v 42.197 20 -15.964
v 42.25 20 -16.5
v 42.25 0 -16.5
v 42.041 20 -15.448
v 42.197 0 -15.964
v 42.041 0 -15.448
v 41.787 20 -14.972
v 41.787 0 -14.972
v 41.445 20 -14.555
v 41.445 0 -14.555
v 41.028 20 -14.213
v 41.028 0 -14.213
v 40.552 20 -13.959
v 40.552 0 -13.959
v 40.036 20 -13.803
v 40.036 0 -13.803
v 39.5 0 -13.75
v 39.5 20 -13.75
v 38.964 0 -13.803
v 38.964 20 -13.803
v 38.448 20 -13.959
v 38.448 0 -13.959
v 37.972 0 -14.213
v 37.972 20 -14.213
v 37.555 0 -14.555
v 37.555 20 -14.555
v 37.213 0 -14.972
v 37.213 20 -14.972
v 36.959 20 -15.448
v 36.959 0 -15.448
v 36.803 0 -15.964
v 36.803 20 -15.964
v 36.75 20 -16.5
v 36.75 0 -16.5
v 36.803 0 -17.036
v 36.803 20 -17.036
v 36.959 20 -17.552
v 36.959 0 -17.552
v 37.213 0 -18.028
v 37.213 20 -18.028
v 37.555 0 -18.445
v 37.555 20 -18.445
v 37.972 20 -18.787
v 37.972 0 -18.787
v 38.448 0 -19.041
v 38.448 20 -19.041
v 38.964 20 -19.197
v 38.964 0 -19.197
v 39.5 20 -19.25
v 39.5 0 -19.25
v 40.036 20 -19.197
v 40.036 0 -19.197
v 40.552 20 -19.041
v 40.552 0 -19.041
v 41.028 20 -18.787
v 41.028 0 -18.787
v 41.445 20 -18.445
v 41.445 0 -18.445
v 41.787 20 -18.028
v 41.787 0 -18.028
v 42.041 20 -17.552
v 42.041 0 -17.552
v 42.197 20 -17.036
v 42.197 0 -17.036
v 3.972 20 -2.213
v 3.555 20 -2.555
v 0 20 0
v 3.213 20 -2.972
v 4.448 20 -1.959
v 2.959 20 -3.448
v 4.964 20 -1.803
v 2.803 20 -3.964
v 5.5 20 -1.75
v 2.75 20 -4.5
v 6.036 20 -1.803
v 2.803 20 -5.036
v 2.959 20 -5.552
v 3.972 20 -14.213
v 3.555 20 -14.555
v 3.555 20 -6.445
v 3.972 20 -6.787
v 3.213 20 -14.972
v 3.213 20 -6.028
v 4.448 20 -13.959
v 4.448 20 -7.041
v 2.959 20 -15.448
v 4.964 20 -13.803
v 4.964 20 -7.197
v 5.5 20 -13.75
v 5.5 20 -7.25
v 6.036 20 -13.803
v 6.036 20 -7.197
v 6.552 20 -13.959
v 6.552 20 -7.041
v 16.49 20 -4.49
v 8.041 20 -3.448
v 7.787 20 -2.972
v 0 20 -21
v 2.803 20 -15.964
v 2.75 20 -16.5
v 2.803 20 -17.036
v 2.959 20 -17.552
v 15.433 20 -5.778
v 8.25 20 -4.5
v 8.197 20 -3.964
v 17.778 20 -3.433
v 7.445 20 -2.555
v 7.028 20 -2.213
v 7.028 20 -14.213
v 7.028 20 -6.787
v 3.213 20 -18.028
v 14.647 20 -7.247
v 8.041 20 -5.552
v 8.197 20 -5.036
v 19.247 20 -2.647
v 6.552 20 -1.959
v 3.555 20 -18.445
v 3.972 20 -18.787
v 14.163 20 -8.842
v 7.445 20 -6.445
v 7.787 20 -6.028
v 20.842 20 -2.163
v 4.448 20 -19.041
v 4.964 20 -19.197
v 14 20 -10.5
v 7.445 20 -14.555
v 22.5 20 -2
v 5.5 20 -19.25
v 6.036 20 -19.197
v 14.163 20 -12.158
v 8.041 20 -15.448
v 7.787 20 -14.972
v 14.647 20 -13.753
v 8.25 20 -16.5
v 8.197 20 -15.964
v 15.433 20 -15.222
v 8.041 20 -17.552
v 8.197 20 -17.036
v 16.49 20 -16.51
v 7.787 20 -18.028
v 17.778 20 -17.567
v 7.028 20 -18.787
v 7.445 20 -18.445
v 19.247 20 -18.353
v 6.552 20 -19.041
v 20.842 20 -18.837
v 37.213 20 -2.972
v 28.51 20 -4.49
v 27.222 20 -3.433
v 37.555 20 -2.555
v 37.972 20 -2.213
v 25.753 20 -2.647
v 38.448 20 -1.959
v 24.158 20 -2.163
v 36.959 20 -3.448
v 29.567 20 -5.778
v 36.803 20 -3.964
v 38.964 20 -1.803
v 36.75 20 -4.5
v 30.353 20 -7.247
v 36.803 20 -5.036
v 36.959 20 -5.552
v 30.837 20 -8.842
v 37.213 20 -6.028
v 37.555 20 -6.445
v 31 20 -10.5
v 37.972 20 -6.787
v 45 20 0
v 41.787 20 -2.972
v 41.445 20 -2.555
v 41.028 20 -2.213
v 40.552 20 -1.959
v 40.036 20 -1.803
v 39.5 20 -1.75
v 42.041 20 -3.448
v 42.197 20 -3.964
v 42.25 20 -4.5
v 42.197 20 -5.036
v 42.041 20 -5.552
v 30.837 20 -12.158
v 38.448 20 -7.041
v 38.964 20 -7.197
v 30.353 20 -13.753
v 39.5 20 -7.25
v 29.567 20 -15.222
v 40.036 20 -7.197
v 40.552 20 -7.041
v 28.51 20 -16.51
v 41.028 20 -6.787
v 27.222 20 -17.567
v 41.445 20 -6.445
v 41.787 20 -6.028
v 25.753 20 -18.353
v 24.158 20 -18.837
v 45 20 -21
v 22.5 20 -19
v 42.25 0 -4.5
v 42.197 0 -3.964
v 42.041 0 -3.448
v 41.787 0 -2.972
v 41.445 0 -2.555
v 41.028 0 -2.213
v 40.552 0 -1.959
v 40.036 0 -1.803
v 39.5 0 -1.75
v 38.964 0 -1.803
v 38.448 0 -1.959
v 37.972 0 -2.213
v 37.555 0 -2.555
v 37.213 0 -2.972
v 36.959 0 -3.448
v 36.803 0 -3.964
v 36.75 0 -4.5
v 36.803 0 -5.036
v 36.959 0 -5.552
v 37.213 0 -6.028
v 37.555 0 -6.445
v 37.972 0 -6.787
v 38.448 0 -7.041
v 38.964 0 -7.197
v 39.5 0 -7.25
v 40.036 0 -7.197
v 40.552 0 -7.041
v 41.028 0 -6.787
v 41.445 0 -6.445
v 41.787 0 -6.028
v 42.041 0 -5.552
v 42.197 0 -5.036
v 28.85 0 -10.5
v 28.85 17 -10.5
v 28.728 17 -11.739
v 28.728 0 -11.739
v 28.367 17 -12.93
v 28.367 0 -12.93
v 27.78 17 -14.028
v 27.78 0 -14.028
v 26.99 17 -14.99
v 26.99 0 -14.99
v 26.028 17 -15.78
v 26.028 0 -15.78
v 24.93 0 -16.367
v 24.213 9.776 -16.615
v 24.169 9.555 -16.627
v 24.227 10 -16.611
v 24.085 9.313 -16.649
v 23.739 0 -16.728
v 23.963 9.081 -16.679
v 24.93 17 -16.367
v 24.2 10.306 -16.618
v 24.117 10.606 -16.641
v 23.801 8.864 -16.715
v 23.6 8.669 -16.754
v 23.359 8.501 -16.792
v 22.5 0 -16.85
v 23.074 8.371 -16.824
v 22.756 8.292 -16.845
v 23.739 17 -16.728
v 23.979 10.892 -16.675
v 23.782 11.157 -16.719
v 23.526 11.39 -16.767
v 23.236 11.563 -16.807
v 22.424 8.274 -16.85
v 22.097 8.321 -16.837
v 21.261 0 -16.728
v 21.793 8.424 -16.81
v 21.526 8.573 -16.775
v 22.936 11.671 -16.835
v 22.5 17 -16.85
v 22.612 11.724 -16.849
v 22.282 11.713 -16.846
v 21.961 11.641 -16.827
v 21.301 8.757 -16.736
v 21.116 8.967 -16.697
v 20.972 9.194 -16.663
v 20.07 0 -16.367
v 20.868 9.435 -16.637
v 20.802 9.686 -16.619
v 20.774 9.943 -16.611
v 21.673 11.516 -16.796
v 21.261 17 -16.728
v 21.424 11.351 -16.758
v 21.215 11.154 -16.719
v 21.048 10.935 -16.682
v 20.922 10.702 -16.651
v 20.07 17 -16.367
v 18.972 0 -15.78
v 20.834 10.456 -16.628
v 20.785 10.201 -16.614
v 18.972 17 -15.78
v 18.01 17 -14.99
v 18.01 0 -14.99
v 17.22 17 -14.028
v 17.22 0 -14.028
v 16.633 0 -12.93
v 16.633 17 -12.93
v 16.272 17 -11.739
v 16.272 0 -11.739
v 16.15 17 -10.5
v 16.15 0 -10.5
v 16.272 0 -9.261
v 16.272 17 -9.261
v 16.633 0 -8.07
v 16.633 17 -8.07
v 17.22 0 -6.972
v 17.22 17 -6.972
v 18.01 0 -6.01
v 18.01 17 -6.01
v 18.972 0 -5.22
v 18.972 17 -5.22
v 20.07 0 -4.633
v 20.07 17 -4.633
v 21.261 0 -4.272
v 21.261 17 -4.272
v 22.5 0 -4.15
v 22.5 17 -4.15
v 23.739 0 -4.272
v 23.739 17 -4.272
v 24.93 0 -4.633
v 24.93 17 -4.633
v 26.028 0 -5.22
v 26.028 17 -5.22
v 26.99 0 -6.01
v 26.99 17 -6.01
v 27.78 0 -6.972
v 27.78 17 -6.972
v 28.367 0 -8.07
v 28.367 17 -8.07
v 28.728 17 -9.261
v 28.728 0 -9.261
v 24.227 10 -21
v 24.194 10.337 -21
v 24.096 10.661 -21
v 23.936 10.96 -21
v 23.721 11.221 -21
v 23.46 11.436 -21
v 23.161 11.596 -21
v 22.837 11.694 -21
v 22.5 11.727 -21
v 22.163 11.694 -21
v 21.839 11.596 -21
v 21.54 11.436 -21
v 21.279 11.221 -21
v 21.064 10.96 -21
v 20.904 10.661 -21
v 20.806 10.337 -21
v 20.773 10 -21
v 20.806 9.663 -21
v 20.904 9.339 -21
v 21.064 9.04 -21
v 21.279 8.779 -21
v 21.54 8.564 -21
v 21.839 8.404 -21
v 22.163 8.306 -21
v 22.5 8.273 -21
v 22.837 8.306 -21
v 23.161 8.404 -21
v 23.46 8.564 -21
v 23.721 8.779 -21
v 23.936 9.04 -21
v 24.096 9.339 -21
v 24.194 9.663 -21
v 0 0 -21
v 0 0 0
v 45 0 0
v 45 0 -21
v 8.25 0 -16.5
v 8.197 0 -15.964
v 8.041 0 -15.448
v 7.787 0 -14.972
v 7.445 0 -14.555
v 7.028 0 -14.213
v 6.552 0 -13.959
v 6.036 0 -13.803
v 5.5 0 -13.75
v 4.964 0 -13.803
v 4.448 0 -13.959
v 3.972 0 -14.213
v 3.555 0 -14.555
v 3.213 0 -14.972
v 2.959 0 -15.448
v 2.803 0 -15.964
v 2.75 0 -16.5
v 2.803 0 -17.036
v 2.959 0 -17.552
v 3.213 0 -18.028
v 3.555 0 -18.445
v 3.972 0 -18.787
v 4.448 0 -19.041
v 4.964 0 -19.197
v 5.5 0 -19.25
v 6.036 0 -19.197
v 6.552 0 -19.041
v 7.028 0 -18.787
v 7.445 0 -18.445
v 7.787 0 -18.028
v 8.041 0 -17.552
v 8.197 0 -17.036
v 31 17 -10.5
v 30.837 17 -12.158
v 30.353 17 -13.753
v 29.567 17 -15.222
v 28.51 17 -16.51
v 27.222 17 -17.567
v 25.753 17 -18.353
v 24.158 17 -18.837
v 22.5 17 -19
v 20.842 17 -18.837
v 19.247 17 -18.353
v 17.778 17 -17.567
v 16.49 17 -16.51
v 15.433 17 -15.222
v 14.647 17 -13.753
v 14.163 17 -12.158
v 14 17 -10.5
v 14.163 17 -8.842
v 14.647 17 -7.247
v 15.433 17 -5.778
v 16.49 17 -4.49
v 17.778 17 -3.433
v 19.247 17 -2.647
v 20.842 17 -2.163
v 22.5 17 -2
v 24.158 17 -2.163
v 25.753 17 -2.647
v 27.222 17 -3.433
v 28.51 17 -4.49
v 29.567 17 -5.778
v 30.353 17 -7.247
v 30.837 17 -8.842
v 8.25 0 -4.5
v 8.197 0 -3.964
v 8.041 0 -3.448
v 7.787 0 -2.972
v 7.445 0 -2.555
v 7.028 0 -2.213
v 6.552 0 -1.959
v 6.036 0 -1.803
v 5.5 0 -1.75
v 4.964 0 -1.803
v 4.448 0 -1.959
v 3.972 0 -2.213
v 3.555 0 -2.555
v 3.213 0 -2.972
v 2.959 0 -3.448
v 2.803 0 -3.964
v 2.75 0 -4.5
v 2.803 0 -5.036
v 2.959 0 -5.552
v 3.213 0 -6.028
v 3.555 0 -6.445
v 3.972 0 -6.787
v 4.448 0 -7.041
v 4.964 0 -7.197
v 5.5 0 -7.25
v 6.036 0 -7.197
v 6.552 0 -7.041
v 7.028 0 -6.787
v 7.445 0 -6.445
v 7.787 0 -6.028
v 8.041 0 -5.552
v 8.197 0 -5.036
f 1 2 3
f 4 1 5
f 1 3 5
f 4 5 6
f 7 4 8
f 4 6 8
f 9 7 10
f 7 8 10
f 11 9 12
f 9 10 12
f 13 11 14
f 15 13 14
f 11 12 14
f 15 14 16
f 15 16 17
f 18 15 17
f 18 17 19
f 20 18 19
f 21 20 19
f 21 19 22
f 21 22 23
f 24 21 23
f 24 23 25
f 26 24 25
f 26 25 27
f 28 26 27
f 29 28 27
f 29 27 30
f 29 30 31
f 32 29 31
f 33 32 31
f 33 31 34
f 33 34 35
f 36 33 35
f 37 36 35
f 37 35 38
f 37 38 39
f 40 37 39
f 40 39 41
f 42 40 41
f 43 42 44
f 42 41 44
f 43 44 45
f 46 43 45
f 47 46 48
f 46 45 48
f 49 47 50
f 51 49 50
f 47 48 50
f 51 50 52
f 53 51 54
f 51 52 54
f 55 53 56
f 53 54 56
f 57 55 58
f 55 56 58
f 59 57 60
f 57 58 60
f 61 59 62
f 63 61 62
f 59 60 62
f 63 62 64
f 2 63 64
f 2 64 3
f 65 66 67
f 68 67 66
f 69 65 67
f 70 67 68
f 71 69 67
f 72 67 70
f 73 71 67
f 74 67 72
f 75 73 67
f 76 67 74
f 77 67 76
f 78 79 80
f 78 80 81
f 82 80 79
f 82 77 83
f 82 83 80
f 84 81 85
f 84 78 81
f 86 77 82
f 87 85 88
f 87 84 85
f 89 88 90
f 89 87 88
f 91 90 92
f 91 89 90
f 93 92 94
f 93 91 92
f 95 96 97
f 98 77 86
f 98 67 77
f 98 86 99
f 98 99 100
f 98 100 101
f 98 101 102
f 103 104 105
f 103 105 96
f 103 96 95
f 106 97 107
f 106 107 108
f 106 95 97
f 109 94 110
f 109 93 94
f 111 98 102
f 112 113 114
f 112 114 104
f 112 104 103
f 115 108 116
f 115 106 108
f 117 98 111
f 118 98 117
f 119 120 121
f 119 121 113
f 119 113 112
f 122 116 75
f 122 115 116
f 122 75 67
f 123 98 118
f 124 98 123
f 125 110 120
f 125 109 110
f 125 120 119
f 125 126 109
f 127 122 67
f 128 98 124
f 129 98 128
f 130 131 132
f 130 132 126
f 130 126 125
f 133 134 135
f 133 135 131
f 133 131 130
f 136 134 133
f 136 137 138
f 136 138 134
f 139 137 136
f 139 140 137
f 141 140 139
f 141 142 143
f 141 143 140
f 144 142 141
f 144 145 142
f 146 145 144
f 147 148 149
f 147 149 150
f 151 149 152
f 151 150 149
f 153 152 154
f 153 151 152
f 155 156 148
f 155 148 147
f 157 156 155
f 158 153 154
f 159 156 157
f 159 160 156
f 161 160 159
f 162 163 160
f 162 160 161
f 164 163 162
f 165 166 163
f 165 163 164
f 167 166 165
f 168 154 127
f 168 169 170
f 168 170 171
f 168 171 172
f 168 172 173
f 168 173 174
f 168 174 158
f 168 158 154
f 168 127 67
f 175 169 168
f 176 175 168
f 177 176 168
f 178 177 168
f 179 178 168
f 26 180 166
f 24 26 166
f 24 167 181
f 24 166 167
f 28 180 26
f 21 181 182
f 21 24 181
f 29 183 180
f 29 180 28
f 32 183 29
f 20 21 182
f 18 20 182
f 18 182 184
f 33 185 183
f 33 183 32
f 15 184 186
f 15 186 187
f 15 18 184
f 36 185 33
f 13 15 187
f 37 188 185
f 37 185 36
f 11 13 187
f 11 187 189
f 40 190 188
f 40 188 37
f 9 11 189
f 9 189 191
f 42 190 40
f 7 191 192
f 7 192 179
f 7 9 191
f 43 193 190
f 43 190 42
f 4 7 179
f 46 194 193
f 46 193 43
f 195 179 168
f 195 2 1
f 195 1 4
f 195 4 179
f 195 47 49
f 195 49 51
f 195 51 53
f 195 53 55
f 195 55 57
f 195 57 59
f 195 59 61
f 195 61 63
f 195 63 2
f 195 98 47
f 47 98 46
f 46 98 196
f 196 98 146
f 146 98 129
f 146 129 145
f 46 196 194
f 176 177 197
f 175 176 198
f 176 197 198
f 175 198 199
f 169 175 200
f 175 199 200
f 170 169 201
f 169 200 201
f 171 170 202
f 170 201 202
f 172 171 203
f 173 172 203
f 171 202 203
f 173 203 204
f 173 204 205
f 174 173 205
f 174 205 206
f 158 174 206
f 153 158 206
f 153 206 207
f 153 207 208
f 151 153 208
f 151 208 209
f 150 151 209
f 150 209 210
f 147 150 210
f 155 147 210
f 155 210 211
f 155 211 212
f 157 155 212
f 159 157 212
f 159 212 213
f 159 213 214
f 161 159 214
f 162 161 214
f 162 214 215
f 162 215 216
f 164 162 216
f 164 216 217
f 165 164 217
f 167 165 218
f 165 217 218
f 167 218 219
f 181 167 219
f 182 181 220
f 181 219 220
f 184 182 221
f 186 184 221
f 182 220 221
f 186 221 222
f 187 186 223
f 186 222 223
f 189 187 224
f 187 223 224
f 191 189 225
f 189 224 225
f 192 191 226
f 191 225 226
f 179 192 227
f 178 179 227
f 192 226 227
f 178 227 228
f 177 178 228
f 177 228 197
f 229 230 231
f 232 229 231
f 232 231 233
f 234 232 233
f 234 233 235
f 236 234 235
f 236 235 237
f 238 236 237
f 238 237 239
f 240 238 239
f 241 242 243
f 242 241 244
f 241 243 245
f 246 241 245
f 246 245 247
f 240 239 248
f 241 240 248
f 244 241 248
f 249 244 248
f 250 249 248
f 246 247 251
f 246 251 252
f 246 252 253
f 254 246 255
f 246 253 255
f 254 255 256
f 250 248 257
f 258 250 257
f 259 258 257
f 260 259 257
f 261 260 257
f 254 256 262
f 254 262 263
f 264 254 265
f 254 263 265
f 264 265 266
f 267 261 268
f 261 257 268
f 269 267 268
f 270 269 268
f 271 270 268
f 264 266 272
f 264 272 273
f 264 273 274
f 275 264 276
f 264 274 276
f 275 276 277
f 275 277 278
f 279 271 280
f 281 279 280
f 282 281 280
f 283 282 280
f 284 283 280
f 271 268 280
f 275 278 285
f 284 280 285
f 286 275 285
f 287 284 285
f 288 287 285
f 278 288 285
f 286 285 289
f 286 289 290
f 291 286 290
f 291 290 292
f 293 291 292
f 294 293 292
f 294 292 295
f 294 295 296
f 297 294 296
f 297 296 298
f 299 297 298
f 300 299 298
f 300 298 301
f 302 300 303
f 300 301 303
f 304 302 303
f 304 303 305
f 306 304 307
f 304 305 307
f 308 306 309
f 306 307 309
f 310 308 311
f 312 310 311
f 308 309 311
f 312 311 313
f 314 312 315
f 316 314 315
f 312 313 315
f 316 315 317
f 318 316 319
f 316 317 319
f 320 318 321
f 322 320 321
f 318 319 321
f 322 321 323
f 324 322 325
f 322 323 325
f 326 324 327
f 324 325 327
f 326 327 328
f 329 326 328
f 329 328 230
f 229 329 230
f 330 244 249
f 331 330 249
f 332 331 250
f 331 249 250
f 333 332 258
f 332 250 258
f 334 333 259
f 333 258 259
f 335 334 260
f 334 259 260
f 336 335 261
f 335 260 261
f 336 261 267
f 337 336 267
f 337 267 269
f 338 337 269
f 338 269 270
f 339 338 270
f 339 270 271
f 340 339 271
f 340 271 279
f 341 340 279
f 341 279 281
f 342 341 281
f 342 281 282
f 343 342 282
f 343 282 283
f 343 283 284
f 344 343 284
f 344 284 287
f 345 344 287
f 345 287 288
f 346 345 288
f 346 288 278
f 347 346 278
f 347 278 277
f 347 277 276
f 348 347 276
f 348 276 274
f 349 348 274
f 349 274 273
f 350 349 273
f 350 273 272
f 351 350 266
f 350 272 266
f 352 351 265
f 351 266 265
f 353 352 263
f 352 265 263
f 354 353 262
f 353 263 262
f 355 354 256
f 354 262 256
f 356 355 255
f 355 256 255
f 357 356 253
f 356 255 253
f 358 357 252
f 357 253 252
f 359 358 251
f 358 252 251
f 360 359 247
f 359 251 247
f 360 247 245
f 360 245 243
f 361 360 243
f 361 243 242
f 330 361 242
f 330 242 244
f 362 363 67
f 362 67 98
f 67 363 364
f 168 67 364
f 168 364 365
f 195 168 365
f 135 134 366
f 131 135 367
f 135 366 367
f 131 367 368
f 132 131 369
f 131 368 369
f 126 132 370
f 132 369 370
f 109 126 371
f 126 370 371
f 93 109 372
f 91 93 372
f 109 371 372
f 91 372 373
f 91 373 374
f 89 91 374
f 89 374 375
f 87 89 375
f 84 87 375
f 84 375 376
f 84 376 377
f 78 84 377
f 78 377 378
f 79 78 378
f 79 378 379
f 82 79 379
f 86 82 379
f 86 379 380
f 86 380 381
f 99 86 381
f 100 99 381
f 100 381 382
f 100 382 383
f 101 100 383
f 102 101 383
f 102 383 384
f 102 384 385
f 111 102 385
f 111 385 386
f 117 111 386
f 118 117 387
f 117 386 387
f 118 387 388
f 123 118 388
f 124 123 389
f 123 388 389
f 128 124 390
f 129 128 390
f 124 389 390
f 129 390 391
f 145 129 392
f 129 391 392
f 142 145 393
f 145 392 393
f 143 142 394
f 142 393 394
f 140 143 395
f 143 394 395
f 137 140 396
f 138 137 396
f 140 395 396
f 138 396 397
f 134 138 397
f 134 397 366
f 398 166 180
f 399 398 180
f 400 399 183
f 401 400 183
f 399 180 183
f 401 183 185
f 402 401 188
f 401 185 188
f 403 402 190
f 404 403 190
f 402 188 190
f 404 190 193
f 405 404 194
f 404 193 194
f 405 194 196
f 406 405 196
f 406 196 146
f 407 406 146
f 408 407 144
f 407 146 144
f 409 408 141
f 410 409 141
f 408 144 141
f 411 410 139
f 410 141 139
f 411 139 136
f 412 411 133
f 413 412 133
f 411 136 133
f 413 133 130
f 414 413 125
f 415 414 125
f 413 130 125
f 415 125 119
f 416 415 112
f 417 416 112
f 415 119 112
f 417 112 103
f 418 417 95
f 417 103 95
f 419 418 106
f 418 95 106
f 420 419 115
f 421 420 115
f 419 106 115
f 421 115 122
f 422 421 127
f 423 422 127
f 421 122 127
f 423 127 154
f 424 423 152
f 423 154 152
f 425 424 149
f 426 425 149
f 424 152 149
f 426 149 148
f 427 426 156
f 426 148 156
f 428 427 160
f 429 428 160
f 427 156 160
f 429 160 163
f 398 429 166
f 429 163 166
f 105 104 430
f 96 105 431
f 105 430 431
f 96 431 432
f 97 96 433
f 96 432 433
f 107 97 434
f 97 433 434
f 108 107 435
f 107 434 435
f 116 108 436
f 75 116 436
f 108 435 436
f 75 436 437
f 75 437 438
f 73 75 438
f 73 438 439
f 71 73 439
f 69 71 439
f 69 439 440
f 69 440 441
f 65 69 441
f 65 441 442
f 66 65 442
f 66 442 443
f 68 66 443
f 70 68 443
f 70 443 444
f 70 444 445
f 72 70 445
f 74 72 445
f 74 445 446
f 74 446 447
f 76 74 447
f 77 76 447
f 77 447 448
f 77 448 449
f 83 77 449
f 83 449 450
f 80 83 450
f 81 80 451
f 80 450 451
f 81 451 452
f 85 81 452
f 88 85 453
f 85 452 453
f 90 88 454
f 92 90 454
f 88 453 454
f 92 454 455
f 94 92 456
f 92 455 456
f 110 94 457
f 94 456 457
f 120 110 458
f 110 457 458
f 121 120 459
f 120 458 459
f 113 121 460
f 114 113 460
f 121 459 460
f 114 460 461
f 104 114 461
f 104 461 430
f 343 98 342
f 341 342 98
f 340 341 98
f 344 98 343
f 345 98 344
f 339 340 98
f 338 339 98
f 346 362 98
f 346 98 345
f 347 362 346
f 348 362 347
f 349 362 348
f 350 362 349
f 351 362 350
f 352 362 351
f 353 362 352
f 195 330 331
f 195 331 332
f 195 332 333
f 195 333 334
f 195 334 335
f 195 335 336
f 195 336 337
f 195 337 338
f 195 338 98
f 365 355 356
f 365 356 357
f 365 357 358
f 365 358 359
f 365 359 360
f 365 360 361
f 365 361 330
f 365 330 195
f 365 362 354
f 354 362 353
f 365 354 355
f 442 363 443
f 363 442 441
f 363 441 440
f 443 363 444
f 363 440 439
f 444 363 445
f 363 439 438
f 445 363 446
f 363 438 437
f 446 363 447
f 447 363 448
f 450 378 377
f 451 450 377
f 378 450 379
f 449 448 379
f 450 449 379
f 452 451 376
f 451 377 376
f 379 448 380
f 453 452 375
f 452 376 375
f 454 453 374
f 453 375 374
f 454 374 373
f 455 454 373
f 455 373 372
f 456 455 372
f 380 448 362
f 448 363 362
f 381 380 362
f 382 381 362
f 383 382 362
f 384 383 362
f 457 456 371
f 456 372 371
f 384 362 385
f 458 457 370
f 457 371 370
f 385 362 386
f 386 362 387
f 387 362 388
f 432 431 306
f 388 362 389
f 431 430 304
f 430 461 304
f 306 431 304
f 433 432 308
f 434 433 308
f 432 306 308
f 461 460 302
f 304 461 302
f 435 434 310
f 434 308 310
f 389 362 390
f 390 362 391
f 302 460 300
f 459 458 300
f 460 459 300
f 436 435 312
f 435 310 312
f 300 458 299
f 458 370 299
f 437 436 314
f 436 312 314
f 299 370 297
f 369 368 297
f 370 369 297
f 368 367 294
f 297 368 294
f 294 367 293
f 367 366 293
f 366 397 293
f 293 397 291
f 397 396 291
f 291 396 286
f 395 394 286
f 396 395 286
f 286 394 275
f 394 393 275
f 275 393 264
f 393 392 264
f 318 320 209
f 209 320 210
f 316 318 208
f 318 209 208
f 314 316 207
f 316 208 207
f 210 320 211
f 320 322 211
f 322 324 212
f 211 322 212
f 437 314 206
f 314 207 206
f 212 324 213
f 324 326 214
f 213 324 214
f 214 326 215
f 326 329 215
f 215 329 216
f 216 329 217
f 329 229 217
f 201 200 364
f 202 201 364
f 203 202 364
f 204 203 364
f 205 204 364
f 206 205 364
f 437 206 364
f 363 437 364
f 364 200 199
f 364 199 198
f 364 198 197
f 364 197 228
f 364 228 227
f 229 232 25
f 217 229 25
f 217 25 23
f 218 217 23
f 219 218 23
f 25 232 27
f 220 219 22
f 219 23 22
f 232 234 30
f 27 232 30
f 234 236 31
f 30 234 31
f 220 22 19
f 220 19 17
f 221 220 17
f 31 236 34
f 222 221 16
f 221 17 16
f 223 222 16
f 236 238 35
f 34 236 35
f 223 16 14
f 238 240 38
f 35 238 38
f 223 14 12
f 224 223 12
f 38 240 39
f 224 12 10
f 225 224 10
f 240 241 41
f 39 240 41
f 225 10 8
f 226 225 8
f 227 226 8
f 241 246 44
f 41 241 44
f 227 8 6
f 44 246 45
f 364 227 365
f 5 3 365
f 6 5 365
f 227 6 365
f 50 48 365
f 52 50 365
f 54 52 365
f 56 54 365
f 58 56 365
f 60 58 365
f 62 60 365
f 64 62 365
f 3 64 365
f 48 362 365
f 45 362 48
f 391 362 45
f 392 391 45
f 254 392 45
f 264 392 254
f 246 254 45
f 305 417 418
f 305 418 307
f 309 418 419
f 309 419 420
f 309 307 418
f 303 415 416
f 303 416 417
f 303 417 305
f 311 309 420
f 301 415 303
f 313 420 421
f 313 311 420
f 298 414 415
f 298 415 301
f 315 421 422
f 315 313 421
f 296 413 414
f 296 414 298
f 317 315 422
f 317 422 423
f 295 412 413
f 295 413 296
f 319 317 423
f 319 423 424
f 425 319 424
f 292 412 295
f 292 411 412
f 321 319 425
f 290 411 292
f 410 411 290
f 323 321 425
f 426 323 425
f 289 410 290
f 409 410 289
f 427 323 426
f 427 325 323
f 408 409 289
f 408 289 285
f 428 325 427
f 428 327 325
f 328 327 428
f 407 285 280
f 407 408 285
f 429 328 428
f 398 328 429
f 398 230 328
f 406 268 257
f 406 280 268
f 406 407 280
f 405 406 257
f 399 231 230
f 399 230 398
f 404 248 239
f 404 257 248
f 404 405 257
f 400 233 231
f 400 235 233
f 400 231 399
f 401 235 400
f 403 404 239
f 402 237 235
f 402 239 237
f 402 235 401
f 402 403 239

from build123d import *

# Parameters (mm, degrees)
SKETCH1_W                 = 45
SKETCH1_H                 = 21
BOSS_EXTRUDE1_DEPTH       = 20
SKETCH2_R                 = 2.75
ALIGNMENTHOLES_DEPTH      = 21
SKETCH4_R                 = 8.5
PIEZOCUT_DEPTH            = 3
F_0_535_40_TAPPED_HOLE1_D = 12.7
F_8_32_TAPPED_HOLE2_D     = 3.4544
F_8_32_TAPPED_HOLE2_DEPTH = 10
F_8_32_TAPPED_HOLE2_TIP   = 1.037806461


with BuildPart() as part:
    # Sketch1 → Boss-Extrude1 (new body)
    with BuildSketch(Plane(origin=(0, 0, 0), x_dir=(1, 0, 0), z_dir=(0, 1, 0))):
        with Locations((22.5, 10.5)):
            Rectangle(SKETCH1_W, SKETCH1_H)
    extrude(amount=BOSS_EXTRUDE1_DEPTH)

    # Sketch2 → AlignmentHoles (cut, through all)
    with BuildSketch(Plane.XZ):
        with Locations((39.5, -16.5)):
            Circle(SKETCH2_R)
        with Locations((39.5, -4.5)):
            Circle(SKETCH2_R)
        with Locations((5.5, -16.5)):
            Circle(SKETCH2_R)
        with Locations((5.5, -4.5)):
            Circle(SKETCH2_R)
    extrude(amount=-ALIGNMENTHOLES_DEPTH, mode=Mode.SUBTRACT)

    # Sketch4 → PiezoCut (cut)
    with BuildSketch(Plane(origin=(0, 20, 0), x_dir=(1, 0, 0), z_dir=(0, 1, 0))):
        with Locations((22.5, 10.5)):
            Circle(SKETCH4_R)
    extrude(amount=-PIEZOCUT_DEPTH, mode=Mode.SUBTRACT)

    # 0.535-40 Tapped Hole1 (through all)
    with Locations(Plane(origin=(0, 0, 0), x_dir=(-1, 0, 0), z_dir=(0, -1, 0))):
        with Locations((-22.5, 10.5)):
            Hole(F_0_535_40_TAPPED_HOLE1_D / 2)

    # #8-32 Tapped Hole2
    with Locations(Plane(origin=(0, 0, -21), x_dir=(-1, 0, 0), z_dir=(0, 0, -1))):
        with Locations((-22.5, 10)):
            Hole(F_8_32_TAPPED_HOLE2_D / 2, depth=F_8_32_TAPPED_HOLE2_DEPTH)
            with Locations((0, 0, -(F_8_32_TAPPED_HOLE2_DEPTH + F_8_32_TAPPED_HOLE2_TIP / 2))):  # 118° drill point
                Cone(0, F_8_32_TAPPED_HOLE2_D / 2, F_8_32_TAPPED_HOLE2_TIP, mode=Mode.SUBTRACT)


solid = part.part
